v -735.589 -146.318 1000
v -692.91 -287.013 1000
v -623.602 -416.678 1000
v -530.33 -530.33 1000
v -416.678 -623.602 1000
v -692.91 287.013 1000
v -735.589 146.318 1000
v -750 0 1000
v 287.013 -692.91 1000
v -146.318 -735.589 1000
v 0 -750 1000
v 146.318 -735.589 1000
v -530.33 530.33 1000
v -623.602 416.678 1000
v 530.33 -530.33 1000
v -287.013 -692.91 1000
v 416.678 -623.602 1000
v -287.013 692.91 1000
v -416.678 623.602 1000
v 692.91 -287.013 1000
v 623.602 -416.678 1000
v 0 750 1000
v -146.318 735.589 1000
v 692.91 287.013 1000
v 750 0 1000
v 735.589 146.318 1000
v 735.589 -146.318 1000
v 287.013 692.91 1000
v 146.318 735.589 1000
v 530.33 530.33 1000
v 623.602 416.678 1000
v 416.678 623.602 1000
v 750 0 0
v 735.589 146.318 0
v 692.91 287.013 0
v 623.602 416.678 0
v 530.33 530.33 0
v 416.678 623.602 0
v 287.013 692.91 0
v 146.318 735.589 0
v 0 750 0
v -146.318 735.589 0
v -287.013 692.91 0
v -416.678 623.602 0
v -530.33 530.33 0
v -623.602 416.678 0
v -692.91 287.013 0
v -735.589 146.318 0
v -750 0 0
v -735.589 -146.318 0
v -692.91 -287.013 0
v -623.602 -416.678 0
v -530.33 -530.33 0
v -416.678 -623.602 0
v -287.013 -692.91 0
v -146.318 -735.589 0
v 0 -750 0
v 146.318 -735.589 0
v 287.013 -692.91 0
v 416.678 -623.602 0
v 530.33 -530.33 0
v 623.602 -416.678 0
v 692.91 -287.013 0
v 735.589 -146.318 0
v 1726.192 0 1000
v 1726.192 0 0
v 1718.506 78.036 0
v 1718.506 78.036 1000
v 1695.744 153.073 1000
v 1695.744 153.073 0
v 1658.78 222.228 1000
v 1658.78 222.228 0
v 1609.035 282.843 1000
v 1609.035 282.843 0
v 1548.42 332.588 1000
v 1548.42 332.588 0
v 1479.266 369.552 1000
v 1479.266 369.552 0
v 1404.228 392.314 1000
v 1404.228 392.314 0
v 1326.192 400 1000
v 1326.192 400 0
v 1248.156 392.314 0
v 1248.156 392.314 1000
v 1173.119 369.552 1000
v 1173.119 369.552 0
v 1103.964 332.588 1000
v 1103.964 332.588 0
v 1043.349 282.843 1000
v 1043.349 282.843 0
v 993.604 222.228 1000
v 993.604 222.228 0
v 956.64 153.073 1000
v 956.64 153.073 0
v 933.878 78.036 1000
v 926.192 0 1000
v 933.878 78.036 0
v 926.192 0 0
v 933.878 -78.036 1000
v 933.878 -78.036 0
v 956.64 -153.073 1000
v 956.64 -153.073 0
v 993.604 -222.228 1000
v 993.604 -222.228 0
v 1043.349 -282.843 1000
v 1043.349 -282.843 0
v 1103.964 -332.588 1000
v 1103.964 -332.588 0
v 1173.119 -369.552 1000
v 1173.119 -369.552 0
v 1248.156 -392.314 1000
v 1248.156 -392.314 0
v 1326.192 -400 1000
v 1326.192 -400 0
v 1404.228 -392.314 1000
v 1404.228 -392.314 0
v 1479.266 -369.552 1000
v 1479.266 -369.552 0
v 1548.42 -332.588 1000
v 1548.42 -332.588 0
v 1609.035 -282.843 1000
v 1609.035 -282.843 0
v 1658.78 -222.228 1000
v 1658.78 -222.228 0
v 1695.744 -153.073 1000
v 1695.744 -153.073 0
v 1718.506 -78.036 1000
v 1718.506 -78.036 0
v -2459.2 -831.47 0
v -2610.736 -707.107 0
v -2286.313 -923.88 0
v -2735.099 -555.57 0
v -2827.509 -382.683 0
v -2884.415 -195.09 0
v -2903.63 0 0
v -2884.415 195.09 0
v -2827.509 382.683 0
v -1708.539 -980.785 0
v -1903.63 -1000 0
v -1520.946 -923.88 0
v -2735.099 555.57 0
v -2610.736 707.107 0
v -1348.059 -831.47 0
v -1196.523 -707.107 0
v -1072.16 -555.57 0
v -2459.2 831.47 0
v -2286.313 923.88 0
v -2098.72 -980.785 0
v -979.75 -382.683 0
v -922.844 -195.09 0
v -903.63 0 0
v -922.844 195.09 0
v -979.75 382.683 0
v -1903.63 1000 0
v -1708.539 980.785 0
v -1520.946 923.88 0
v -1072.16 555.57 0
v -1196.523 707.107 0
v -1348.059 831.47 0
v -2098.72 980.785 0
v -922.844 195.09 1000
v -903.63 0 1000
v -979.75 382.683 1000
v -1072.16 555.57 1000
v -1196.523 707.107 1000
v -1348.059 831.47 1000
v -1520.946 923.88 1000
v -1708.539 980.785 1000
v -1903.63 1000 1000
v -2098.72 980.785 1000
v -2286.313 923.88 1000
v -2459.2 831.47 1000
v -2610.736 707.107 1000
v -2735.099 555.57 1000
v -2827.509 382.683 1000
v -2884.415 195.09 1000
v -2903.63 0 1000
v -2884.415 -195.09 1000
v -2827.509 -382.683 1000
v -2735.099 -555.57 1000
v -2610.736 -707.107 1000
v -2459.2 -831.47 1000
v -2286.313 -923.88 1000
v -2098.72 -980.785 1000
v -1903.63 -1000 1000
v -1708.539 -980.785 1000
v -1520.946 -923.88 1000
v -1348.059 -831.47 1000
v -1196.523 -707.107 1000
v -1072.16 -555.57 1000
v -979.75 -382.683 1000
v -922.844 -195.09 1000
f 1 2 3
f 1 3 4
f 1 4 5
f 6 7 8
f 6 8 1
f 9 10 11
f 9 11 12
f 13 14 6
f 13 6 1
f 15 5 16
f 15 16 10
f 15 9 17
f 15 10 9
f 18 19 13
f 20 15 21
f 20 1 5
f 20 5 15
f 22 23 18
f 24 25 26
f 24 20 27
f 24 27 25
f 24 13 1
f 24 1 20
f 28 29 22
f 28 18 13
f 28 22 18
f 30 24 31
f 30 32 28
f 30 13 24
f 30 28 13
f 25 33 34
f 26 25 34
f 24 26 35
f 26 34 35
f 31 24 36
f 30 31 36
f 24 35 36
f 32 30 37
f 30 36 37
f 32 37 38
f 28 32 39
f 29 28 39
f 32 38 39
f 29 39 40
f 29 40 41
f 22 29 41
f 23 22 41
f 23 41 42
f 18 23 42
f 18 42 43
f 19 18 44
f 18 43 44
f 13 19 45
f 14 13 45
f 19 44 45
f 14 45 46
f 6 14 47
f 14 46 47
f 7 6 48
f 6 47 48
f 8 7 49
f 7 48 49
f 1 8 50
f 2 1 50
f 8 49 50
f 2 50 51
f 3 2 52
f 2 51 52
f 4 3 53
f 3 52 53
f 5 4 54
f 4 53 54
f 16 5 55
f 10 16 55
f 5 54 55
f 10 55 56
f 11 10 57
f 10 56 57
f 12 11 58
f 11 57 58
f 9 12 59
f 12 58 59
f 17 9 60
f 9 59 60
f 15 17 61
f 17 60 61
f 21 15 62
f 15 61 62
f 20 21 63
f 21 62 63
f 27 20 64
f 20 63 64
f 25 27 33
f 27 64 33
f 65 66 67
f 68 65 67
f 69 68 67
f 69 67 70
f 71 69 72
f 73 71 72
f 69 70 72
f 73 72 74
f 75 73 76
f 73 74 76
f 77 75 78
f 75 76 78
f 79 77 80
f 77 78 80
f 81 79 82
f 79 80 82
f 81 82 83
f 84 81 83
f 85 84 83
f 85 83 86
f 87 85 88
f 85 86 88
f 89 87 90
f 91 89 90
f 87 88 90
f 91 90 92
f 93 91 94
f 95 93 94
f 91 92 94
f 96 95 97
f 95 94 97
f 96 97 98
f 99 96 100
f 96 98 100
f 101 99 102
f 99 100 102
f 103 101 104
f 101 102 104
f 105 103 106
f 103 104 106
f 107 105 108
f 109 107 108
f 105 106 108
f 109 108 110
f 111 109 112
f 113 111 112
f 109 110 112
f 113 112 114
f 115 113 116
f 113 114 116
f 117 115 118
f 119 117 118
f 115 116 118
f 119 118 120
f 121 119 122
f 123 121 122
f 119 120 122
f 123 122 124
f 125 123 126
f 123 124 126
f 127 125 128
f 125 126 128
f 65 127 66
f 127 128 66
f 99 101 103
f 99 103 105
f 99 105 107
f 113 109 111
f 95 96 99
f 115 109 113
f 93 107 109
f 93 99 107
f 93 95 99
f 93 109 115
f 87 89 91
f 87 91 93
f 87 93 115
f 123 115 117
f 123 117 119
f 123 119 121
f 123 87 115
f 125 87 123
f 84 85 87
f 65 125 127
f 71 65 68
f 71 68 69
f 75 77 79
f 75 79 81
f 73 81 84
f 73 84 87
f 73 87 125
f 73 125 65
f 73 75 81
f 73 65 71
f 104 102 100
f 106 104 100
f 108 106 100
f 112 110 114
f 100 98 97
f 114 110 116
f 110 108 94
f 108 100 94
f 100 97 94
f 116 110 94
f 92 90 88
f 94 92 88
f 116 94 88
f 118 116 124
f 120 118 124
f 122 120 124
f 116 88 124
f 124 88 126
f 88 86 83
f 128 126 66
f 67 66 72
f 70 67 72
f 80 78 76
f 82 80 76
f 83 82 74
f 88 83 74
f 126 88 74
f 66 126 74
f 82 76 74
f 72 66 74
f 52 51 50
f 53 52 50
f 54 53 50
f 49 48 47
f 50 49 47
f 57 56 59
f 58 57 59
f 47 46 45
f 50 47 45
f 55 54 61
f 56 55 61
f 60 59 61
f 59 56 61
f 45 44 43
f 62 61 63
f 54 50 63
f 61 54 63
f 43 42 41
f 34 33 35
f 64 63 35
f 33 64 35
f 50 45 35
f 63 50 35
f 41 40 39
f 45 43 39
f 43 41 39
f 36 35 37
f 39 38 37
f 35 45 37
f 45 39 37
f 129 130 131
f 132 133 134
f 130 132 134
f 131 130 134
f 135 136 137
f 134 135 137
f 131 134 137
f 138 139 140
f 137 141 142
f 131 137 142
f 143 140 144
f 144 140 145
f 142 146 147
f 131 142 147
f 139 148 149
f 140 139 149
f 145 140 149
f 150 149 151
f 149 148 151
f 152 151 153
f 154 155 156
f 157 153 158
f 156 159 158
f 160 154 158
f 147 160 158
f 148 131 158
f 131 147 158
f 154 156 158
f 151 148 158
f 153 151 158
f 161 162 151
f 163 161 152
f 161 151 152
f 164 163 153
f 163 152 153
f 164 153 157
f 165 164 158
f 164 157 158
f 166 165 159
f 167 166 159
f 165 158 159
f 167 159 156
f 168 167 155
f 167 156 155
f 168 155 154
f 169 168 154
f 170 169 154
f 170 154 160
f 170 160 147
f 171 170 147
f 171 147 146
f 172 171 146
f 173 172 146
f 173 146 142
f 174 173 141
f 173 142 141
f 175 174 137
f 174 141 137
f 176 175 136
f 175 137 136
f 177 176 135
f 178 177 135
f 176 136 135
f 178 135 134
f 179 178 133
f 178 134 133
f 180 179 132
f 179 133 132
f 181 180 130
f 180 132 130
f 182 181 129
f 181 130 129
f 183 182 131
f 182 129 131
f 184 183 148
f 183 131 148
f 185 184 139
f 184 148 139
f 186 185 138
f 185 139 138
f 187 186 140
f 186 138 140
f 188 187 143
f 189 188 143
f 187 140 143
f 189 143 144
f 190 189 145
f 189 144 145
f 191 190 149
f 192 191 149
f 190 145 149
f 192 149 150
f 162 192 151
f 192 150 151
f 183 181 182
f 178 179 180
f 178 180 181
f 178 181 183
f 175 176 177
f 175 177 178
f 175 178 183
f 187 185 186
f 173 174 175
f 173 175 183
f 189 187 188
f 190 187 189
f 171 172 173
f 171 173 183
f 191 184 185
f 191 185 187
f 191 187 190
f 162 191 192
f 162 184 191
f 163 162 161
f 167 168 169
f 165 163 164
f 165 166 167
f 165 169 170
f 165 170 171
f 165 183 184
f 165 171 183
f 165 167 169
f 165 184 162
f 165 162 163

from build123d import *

# Parameters (mm, degrees)
F0_R     = 1000
F0_R_2   = 750
F0_R_3   = 400
F1_DEPTH = 1000


with BuildPart() as f1:
    # F0 (on Top) → F1 (new body)
    with BuildSketch(Plane.XY):
        with Locations((-1903.629541, 0)):
            Circle(F0_R)
        Circle(F0_R_2)
        with Locations((1326.192141, 0)):
            Circle(F0_R_3)
    extrude(amount=F1_DEPTH)


solid = f1.part
